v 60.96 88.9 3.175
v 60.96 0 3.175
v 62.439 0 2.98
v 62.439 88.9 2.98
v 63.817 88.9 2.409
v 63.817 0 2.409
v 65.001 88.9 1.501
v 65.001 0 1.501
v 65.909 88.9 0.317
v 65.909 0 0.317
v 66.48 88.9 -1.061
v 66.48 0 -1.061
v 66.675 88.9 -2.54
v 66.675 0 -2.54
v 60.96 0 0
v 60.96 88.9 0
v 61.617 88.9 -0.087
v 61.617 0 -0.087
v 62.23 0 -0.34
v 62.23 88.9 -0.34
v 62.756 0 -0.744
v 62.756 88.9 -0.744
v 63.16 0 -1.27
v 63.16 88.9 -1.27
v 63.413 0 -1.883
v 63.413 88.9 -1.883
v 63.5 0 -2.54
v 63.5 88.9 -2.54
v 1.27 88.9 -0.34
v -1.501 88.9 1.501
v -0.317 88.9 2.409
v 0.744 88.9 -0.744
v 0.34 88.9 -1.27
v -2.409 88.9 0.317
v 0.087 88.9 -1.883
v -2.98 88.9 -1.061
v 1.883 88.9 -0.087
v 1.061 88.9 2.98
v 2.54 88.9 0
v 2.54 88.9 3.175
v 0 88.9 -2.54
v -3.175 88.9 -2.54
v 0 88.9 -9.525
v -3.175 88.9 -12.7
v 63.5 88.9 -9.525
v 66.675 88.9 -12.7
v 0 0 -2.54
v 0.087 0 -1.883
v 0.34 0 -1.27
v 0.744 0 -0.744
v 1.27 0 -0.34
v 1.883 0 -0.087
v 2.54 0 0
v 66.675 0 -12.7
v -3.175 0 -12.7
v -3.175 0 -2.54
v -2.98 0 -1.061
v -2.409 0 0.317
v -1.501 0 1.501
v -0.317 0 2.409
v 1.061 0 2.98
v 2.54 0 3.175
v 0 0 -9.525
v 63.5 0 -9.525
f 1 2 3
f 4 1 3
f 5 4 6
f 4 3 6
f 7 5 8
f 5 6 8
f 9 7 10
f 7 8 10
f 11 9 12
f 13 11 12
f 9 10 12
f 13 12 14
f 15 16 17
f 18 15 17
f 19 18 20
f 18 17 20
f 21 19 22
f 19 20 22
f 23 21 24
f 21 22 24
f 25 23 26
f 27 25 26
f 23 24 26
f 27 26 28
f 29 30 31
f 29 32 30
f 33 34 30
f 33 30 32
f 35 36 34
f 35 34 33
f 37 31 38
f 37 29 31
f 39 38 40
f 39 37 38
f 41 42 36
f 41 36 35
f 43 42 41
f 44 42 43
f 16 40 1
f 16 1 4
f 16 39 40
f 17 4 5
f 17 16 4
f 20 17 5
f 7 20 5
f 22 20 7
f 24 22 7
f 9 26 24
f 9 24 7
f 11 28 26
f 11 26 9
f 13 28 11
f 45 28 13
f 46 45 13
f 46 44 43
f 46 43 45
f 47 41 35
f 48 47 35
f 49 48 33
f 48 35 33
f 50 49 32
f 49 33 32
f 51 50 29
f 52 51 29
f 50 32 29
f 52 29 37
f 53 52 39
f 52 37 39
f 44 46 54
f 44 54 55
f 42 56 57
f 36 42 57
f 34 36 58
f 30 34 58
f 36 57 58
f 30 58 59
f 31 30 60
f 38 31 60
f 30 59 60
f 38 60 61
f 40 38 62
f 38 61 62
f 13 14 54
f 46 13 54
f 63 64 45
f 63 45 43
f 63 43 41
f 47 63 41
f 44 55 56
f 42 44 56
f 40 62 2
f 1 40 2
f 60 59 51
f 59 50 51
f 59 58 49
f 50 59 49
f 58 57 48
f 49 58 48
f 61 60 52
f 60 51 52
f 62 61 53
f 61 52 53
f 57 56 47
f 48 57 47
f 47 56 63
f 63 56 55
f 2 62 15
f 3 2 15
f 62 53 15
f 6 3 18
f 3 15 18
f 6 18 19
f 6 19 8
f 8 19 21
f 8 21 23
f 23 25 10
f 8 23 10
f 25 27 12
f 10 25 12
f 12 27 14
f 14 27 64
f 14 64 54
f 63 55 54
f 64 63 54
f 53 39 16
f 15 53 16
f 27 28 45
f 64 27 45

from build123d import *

# Parameters (mm, degrees)
BOSS_EXTRUDE1_DEPTH = 88.9
CUT_EXTRUDE1_DEPTH  = 88.9


with BuildPart() as part:
    # Sketch1 → Boss-Extrude1 (new body)
    with BuildSketch(Plane(origin=(0, 0, 0), x_dir=(1, 0, 0), z_dir=(0, 1, 0))):
        with BuildLine():
            Line((-3.175, 6.985), (-3.175, 2.54))
            ThreePointArc((-3.175, 2.54), (-1.501115254, -1.501115254), (2.54, -3.175))
            Line((2.54, -3.175), (60.96, -3.175))
            ThreePointArc((60.96, -3.175), (65.001115254, -1.501115254), (66.675, 2.54))
            Line((66.675, 2.54), (66.675, 6.985))
            Line((66.675, 6.985), (66.675, 12.7))
            Line((66.675, 12.7), (60.96, 12.7))
            Line((60.96, 12.7), (2.54, 12.7))
            Line((2.54, 12.7), (-3.175, 12.7))
            Line((-3.175, 12.7), (-3.175, 6.985))
        make_face()
    extrude(amount=BOSS_EXTRUDE1_DEPTH)

    # Sketch2 → Cut-Extrude1 (cut)
    with BuildSketch(Plane(origin=(0, 88.9, 0), x_dir=(1, 0, 0), z_dir=(0, 1, 0))):
        with BuildLine():
            Line((2.54, 9.525), (0, 9.525))
            Line((0, 9.525), (0, 6.985))
            Line((0, 6.985), (0, 2.54))
            ThreePointArc((0, 2.54), (0.743948776, 0.743948776), (2.54, 0))
            Line((2.54, 0), (60.96, 0))
            ThreePointArc((60.96, 0), (62.756051224, 0.743948776), (63.5, 2.54))
            Line((63.5, 2.54), (63.5, 6.985))
            Line((63.5, 6.985), (63.5, 9.525))
            Line((63.5, 9.525), (60.96, 9.525))
            Line((60.96, 9.525), (2.54, 9.525))
        make_face()
    extrude(amount=-CUT_EXTRUDE1_DEPTH, mode=Mode.SUBTRACT)


solid = part.part
